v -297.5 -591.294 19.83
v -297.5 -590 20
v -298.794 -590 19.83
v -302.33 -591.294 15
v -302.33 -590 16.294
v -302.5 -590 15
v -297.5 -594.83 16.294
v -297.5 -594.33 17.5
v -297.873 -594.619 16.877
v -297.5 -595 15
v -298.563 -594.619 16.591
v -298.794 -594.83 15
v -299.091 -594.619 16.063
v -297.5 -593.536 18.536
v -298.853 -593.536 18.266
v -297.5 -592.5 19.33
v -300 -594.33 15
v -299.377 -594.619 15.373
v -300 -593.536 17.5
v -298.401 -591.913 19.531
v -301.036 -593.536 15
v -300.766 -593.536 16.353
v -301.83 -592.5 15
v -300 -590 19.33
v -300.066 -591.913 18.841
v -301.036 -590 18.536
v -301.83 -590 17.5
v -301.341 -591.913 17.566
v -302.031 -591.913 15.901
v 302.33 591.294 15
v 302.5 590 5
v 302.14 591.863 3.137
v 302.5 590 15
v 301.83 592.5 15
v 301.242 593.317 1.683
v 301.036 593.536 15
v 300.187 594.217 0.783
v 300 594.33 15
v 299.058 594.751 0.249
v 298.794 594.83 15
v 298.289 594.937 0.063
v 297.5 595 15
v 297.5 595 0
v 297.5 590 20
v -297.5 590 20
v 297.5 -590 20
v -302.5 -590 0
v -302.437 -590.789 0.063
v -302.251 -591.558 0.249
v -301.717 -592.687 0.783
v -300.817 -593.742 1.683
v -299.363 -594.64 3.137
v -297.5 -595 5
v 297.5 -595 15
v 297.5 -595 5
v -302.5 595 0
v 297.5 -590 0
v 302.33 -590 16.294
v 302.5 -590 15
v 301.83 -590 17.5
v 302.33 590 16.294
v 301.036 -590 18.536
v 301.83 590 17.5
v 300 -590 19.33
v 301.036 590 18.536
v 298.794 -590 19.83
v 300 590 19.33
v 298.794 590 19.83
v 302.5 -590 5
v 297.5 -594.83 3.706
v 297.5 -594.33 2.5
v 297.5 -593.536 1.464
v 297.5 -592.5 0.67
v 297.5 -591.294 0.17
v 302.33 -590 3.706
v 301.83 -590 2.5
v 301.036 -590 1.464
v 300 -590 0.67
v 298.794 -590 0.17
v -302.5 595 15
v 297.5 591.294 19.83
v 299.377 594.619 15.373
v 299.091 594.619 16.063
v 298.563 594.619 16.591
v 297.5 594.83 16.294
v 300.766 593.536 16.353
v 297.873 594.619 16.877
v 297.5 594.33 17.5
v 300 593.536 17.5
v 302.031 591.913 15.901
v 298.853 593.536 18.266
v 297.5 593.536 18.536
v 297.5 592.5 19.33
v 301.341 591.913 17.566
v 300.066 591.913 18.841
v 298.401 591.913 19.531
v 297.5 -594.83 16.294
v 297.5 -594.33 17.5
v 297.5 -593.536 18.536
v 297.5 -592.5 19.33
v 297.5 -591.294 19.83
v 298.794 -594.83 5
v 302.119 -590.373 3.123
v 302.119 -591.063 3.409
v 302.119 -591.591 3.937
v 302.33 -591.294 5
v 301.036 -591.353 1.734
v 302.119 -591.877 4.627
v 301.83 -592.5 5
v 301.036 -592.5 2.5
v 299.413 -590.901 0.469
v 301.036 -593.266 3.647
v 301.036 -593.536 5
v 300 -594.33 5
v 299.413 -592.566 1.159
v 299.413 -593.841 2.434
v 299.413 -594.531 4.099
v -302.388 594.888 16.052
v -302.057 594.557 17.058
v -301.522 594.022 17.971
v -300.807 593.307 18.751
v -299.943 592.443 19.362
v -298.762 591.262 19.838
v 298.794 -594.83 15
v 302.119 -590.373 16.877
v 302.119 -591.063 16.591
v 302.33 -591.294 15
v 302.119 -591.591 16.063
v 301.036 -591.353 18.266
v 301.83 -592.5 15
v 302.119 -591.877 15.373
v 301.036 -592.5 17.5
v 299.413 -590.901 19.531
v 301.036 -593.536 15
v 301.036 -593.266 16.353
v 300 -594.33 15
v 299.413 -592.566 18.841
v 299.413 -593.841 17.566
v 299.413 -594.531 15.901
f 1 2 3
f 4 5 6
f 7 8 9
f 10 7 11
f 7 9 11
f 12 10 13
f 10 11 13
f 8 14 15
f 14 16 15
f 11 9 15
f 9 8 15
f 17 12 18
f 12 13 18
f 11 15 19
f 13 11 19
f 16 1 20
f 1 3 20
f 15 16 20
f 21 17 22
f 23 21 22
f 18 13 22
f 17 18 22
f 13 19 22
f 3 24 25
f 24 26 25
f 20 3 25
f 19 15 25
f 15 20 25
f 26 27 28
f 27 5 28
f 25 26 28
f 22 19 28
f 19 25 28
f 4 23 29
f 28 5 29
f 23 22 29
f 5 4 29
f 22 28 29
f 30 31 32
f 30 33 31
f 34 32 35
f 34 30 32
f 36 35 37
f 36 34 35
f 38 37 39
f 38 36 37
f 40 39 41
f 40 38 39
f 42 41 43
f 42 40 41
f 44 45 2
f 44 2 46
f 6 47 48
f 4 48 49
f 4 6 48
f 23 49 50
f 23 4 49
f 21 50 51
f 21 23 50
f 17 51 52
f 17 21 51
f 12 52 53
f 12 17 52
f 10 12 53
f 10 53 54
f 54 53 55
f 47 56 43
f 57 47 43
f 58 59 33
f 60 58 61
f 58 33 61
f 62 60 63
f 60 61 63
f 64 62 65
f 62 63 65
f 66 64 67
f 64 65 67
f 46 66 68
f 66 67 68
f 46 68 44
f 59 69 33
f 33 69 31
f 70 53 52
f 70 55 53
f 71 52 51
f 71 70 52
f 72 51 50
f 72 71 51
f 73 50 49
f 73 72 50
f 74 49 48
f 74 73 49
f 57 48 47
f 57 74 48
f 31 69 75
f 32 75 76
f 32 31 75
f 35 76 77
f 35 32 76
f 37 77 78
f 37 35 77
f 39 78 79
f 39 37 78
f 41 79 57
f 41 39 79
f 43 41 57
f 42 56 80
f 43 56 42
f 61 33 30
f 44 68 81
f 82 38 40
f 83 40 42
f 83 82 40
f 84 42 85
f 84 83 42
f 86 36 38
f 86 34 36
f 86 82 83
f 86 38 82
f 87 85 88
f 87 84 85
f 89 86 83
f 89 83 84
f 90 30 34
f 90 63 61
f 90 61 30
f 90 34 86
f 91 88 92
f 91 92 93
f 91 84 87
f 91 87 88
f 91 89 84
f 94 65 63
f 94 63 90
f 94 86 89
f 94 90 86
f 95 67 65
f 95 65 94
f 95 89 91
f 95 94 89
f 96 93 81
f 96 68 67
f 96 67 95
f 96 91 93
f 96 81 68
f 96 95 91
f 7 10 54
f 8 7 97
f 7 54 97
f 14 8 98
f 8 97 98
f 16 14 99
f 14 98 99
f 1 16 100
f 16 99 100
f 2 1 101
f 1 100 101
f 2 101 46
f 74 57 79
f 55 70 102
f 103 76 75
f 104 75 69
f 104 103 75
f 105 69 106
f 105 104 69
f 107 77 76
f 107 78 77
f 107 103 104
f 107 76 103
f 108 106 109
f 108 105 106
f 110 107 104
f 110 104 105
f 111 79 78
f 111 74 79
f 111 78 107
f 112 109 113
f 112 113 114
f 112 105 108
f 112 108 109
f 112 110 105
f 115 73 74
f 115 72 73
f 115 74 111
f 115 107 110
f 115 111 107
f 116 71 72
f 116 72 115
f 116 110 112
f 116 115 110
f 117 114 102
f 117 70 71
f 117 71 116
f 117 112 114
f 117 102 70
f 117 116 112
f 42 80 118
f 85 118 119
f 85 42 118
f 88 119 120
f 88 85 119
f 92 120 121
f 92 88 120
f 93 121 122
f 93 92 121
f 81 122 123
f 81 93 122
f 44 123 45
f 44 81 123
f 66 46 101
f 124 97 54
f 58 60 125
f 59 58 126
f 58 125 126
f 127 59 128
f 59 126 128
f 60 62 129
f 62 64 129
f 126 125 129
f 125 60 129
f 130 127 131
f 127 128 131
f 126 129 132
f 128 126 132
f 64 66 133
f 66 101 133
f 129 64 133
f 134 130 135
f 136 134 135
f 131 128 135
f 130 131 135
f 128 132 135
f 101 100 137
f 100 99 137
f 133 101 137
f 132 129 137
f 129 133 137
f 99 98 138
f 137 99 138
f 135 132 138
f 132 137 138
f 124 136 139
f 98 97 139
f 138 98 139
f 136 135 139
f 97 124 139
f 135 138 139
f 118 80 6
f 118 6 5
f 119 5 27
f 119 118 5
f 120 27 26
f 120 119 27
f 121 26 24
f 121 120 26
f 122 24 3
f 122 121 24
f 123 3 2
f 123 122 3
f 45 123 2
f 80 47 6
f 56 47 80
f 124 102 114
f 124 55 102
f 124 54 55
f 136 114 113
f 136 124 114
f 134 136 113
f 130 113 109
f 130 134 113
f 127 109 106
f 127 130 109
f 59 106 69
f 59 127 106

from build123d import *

# Parameters (mm, degrees)
SKETCH1_W           = 605
SKETCH1_H           = 1190
BOSS_EXTRUDE1_DEPTH = 20
FILLET1_R           = 5


with BuildPart() as part:
    # Sketch1 → Boss-Extrude1 (new body)
    with BuildSketch(Plane.XY):
        Rectangle(SKETCH1_W, SKETCH1_H)
    extrude(amount=BOSS_EXTRUDE1_DEPTH)

    # Fillet1
    fillet1_edges = [part.edges().sort_by_distance(p)[0] for p in [
        (-302.5, 0, 20),
        (0, -595, 20),
        (302.5, 0, 20),
        (0, -595, 0),
        (302.5, 0, 0),
        (302.5, -595, 10),
        (-302.5, -595, 10),
        (302.5, 595, 10),
        (0, 595, 20),
    ]]
    fillet(fillet1_edges, radius=FILLET1_R)


solid = part.part
